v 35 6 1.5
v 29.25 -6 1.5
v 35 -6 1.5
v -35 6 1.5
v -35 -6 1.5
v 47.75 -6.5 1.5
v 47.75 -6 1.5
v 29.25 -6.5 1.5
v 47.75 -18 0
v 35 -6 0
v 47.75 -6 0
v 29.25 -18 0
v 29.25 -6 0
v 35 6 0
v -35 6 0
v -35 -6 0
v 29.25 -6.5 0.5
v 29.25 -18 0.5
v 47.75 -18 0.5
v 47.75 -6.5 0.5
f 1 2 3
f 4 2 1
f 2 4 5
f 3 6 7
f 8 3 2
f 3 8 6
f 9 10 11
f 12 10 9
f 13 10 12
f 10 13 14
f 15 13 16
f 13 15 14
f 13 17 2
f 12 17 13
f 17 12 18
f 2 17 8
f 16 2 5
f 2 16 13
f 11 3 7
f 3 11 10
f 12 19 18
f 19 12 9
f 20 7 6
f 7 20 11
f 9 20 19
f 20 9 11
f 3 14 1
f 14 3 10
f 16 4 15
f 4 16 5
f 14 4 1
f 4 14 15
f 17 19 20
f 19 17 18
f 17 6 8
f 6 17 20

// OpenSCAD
// 10-well comb for casting agarose gels, printed lying flat
// Units: mm

// ---- Spine (back bar) ----
spine_len   = 70;    // spine length along X
spine_wid   = 12;    // spine width along Y
plate_thk   = 1.5;   // plate thickness along Z

// ---- Teeth ----
tooth_count = 10;    // number of teeth
tooth_w     = 5.0;   // tooth width along X
tooth_l     = 12;    // tooth length along Y (hangs in -Y)
tooth_pitch = 1.5;   // centre-to-centre spacing along X

// ---- Misc ----
eps = 0.5;           // overcut for clean differences
$fn = 64;

// Derived
gaps = tooth_count - 1;              // number of gaps
row_w = tooth_w * tooth_count + tooth_pitch * gaps;  // row width in X

difference() {
    // Plate: spine + teeth
    union() {
        translate([-spine_len/2, -spine_wid/2, 0])
            cube([spine_len, spine_wid, plate_thk]);
        for (i = [0 : tooth_count - 1])
            translate([(row_w - tooth_w)/2 + i * tooth_pitch, -spine_wid/2 - tooth_l, 0])
                cube([tooth_w, tooth_l, plate_thk]);
    }

    // Wells: cut into plate from +Z, through the teeth
    for (i = [0 : tooth_count - 1])
        translate([(row_w - tooth_w)/2 + i * tooth_pitch, -spine_wid/2 - tooth_l - eps, eps])
            cube([tooth_w, tooth_l, plate_thk + 2 * eps]);
}
